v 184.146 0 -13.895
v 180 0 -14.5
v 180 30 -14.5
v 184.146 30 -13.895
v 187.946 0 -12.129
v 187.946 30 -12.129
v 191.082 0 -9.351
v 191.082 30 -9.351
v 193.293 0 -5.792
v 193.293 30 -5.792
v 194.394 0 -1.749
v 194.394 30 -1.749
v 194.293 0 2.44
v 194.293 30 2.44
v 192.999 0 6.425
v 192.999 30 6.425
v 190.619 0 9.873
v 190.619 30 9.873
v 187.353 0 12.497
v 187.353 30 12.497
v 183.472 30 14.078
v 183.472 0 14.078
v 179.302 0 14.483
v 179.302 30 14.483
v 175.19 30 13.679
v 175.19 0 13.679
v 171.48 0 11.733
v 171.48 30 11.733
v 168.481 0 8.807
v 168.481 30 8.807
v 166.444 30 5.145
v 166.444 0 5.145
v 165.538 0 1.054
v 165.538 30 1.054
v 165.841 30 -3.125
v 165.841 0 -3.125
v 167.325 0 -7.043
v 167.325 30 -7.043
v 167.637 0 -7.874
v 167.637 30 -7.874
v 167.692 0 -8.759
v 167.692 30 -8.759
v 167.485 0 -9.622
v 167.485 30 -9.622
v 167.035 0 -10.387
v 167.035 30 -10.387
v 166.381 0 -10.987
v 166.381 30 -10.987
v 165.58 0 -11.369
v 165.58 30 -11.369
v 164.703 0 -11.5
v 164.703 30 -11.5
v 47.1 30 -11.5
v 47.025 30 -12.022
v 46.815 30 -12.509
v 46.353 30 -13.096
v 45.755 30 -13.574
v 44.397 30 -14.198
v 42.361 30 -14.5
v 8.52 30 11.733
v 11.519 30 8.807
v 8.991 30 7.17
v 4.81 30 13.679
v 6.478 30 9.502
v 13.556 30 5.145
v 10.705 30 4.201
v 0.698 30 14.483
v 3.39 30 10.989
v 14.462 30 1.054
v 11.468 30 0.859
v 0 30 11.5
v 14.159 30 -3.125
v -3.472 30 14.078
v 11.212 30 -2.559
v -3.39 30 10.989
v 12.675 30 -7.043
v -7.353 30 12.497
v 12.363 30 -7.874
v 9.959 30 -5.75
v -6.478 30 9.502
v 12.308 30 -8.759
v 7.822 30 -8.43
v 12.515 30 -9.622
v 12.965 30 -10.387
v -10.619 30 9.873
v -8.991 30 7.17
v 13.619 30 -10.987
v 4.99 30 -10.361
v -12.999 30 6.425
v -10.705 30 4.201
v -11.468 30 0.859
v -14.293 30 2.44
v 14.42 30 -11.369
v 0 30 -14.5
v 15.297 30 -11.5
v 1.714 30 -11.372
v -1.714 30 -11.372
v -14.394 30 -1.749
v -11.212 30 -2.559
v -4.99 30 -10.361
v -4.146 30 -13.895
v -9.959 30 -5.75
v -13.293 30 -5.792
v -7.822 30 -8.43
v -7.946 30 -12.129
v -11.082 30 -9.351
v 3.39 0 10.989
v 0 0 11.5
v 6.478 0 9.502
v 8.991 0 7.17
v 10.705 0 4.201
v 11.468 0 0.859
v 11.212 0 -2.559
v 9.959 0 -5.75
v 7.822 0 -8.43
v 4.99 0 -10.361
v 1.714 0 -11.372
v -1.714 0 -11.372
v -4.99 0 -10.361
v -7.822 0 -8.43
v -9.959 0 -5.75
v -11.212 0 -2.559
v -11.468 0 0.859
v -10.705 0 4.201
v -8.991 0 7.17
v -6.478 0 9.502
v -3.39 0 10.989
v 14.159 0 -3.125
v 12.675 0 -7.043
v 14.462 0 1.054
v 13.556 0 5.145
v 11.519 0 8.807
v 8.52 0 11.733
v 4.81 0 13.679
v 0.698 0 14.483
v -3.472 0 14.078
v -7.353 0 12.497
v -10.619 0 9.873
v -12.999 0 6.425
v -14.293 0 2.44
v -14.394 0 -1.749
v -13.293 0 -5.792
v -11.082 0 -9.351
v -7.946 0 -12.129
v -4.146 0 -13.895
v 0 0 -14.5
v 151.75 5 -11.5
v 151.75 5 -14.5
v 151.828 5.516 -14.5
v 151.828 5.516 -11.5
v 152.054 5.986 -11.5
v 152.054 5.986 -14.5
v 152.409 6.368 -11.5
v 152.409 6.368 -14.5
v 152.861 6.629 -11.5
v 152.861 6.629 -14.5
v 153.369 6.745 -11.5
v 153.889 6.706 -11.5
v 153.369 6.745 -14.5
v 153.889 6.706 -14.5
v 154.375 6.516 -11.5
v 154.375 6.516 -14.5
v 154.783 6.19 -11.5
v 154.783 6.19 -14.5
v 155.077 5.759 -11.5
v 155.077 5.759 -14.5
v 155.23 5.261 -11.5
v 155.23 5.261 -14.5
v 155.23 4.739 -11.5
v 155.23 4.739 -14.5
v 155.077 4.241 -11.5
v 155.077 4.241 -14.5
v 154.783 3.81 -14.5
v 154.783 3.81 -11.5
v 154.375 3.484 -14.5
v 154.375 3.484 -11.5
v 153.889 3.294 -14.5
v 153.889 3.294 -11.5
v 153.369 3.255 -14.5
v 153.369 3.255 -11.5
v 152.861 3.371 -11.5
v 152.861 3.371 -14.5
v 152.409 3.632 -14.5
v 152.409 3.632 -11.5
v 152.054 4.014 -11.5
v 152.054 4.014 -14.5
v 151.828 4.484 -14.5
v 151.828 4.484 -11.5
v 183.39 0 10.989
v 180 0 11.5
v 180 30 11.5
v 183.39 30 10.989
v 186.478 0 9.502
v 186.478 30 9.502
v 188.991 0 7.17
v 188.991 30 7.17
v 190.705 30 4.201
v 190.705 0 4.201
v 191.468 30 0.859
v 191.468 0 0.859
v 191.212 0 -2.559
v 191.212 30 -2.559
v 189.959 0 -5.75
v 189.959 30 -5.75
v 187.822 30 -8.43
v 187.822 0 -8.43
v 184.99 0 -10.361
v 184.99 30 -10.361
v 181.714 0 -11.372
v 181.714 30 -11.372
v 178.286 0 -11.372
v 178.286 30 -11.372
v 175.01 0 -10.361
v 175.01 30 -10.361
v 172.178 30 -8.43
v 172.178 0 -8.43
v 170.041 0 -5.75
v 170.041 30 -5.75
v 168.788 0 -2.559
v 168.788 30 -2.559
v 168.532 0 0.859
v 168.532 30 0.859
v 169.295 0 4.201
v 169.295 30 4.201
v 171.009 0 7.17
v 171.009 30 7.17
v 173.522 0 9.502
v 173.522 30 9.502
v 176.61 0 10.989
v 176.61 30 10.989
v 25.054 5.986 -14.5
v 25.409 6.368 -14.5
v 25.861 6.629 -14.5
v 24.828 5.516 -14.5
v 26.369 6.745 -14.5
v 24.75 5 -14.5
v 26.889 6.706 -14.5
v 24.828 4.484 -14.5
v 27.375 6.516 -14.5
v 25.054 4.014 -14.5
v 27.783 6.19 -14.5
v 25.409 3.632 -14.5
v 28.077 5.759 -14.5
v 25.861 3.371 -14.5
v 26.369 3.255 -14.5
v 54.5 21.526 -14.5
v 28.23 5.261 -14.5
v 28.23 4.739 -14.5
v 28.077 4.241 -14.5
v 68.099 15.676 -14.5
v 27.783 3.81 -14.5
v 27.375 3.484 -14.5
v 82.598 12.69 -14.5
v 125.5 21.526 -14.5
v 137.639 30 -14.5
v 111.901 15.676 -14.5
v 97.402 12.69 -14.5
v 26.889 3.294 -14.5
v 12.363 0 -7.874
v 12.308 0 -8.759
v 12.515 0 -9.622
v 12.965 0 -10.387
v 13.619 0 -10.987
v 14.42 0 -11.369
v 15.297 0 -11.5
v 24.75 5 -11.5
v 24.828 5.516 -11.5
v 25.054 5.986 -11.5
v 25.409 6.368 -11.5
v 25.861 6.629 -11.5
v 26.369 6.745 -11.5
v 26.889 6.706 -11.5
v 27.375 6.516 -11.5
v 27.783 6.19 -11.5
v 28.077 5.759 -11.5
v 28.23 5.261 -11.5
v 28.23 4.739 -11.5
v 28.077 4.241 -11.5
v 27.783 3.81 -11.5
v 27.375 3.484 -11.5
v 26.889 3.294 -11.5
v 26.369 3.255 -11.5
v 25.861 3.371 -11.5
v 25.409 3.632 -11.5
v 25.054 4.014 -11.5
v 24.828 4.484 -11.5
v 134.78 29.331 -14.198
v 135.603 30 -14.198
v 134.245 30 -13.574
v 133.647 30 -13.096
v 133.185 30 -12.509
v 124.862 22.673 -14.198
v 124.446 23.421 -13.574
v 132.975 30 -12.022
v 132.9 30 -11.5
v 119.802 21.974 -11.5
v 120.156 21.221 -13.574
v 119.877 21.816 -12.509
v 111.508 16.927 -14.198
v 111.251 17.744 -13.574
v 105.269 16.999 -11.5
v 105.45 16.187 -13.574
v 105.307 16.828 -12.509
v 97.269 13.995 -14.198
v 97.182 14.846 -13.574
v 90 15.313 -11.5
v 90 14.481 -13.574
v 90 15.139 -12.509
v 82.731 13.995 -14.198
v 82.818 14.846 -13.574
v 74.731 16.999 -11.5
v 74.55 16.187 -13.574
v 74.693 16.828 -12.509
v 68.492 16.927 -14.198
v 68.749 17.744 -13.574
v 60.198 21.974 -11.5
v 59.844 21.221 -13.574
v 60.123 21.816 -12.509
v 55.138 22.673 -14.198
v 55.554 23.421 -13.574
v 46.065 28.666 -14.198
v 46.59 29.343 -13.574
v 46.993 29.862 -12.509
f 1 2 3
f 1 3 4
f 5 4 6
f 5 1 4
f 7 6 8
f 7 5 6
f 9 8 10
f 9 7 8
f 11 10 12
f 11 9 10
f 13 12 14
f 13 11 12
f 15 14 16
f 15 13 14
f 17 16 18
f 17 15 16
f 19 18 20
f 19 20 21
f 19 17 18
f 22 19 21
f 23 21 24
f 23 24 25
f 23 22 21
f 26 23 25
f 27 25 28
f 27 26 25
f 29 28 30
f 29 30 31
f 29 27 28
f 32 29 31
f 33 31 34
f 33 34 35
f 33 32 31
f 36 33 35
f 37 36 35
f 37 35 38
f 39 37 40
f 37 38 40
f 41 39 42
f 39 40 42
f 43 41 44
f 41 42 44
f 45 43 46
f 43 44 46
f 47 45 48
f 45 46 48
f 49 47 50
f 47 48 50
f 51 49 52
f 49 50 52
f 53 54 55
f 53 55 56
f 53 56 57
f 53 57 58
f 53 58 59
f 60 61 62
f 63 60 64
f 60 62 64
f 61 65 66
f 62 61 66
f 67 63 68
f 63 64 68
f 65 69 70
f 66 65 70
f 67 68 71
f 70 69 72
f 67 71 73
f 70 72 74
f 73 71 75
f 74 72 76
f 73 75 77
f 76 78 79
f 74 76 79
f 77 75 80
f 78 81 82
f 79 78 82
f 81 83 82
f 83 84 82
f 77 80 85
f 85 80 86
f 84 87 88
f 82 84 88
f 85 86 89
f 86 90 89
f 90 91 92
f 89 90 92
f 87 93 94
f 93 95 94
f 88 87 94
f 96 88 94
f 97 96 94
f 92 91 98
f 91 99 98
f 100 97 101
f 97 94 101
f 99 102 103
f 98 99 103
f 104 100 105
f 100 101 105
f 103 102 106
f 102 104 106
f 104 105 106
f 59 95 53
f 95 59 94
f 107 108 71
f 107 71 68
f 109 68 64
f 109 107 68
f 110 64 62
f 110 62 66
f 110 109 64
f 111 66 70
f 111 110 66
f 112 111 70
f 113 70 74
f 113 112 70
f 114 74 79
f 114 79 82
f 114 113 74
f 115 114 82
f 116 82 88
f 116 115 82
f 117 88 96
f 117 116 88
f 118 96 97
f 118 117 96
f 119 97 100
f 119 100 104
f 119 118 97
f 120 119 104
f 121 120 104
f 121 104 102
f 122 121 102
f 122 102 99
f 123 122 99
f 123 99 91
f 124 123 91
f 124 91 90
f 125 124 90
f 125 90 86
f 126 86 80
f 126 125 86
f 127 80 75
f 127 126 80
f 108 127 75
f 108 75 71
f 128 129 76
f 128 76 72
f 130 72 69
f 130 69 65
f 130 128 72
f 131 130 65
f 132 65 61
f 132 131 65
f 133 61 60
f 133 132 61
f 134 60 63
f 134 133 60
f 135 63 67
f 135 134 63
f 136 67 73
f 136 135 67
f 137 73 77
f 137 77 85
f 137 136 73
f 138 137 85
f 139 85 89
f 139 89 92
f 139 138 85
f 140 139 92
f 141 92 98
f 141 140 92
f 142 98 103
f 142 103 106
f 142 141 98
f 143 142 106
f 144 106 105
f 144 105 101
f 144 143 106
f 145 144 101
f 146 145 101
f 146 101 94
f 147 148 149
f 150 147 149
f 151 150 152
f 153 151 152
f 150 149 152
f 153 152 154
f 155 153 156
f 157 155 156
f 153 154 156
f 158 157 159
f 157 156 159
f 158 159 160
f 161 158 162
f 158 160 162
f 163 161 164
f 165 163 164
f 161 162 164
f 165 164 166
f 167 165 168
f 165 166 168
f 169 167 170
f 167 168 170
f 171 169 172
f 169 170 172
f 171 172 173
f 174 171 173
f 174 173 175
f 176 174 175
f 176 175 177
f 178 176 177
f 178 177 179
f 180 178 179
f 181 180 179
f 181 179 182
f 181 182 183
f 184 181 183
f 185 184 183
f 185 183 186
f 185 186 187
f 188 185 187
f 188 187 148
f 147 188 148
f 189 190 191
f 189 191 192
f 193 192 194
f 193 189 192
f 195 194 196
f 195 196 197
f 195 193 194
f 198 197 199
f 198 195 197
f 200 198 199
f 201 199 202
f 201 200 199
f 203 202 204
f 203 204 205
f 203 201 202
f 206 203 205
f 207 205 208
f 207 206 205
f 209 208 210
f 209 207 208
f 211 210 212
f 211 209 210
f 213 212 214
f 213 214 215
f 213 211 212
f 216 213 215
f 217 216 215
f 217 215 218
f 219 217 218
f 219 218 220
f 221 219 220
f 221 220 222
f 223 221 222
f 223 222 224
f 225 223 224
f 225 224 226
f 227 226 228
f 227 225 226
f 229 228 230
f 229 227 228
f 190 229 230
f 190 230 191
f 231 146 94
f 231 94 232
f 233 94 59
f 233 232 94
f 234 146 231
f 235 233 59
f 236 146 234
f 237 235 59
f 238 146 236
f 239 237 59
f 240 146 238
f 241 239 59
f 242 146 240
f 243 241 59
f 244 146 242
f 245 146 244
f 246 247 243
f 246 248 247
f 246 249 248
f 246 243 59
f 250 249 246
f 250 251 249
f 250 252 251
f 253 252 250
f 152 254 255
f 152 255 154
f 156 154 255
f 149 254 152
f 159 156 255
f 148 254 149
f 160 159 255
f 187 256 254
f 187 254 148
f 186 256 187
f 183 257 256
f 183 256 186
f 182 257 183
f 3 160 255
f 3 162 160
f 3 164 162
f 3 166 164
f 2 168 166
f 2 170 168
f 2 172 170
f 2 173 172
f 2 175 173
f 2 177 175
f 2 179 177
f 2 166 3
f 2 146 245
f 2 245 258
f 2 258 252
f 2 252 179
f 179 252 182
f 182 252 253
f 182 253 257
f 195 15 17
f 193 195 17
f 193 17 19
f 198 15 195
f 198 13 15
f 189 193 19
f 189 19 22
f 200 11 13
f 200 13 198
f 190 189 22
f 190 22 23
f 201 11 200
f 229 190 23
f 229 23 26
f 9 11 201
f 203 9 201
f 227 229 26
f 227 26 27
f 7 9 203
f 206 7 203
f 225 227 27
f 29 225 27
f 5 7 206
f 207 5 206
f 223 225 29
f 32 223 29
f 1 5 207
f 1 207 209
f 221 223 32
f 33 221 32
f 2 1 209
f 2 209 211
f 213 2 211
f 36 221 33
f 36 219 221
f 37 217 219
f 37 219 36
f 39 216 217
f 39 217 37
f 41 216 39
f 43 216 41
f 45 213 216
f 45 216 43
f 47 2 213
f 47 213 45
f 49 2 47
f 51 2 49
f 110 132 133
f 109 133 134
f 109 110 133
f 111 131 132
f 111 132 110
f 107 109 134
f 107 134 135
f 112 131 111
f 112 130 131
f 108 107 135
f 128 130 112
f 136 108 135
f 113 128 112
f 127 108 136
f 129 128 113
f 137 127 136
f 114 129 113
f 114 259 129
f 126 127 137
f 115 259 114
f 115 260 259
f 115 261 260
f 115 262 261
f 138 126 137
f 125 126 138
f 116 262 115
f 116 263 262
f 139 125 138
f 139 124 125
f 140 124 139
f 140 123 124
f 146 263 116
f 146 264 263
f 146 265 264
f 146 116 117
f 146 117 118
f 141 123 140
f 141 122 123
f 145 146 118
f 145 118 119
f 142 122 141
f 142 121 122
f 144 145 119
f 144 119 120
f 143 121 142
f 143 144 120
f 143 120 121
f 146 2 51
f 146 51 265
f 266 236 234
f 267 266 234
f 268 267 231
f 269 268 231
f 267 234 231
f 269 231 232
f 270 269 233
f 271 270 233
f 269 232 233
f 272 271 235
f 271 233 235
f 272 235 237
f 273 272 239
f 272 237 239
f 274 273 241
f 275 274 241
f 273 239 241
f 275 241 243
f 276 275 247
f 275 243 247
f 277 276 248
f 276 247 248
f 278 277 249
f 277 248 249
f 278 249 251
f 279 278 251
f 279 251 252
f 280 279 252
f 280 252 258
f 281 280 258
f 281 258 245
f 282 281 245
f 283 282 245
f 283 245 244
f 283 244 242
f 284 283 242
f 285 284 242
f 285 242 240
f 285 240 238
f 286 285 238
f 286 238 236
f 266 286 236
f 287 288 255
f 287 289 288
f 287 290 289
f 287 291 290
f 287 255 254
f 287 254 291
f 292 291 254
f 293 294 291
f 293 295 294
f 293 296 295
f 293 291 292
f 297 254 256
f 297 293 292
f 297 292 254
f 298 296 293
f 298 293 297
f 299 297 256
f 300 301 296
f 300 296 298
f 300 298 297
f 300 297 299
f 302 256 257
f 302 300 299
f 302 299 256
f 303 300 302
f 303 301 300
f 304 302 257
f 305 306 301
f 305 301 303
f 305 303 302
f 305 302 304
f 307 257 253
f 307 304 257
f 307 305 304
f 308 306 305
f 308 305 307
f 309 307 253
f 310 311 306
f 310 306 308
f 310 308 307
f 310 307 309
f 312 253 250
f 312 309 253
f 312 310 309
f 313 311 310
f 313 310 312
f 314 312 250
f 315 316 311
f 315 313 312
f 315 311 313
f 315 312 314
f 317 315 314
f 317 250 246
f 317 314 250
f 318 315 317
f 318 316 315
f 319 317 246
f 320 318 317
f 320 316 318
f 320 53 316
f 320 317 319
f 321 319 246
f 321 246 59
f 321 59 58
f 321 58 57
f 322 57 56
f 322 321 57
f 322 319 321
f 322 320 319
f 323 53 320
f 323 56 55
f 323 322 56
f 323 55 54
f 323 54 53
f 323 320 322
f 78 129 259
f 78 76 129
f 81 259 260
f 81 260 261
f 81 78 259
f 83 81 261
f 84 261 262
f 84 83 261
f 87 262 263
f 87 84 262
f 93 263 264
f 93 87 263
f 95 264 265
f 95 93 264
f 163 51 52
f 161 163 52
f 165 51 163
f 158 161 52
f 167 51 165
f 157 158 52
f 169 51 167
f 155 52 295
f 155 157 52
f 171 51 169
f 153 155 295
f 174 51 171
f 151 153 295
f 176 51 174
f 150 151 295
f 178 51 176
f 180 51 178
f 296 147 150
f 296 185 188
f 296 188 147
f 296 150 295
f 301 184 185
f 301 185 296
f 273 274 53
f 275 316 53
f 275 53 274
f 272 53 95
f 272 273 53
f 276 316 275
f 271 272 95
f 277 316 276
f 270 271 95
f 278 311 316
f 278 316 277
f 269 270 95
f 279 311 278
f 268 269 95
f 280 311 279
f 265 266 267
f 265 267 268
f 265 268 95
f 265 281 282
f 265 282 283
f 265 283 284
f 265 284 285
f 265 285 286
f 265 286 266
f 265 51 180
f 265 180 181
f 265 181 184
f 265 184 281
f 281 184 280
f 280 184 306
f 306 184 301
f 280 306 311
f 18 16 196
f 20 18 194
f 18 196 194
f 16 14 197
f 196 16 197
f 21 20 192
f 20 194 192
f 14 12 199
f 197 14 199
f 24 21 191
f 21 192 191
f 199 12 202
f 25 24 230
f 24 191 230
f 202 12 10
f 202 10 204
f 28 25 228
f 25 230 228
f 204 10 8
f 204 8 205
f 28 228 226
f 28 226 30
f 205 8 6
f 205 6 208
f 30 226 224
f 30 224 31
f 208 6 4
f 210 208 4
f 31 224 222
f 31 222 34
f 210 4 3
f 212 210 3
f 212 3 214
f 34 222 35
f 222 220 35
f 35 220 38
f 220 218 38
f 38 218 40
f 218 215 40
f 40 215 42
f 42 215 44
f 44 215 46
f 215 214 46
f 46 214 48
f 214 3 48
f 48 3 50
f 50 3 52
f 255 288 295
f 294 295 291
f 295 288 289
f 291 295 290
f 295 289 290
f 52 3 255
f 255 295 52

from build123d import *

# Parameters (mm, degrees)
SKETCH1_R           = 11.5
BOSS_EXTRUDE1_DEPTH = 30
FILLET1_R           = 3
SKETCH2_R           = 70
SKETCH2_R_2         = 1.75
CUT_EXTRUDE1_DEPTH  = 30
FILLET2_R           = 3


with BuildPart() as part:
    # Sketch1 → Boss-Extrude1 (new body)
    with BuildSketch(Plane(origin=(0, 0, 0), x_dir=(1, 0, 0), z_dir=(0, 1, 0))):
        with BuildLine():
            Line((0, 14.5), (180, 14.5))
            ThreePointArc((180, 14.5), (184.663689527, -13.729530218), (171.168239134, 11.5))
            Line((171.168239134, 11.5), (8.831760866, 11.5))
            ThreePointArc((8.831760866, 11.5), (-4.663689527, -13.729530218), (0, 14.5))
        make_face()
        with Locations(Location((0, 0, 0), (0, 0, 270))):
            Circle(SKETCH1_R, mode=Mode.SUBTRACT)
        with Locations(Location((180, 0, 0), (0, 0, 270))):
            Circle(SKETCH1_R, mode=Mode.SUBTRACT)
    extrude(amount=BOSS_EXTRUDE1_DEPTH)

    # Fillet1
    fillet1_edges = [part.edges().sort_by_distance(p)[0] for p in [
        (171.168239134, 15, -11.5),
        (8.831760866, 15, -11.5),
    ]]
    fillet(fillet1_edges, radius=FILLET1_R)

    # Sketch2 → Cut-Extrude1 (cut)
    with BuildSketch(Plane(origin=(0, 0, -14.5), x_dir=(-1, 0, 0), z_dir=(0, 0, -1))):
        with Locations((-90, 85.31324406)):
            Circle(SKETCH2_R)
        with Locations((-26.5, 5)):
            Circle(SKETCH2_R_2)
        with Locations((-153.5, 5)):
            Circle(SKETCH2_R_2)
    extrude(amount=-CUT_EXTRUDE1_DEPTH, mode=Mode.SUBTRACT)

    # Fillet2
    fillet2_edges = [part.edges().sort_by_distance(p)[0] for p in [
        (90, 15.31324406, -14.5),
    ]]
    fillet(fillet2_edges, radius=FILLET2_R - 0.0001)  # a hair under: the kernel refuses the full size


solid = part.part
